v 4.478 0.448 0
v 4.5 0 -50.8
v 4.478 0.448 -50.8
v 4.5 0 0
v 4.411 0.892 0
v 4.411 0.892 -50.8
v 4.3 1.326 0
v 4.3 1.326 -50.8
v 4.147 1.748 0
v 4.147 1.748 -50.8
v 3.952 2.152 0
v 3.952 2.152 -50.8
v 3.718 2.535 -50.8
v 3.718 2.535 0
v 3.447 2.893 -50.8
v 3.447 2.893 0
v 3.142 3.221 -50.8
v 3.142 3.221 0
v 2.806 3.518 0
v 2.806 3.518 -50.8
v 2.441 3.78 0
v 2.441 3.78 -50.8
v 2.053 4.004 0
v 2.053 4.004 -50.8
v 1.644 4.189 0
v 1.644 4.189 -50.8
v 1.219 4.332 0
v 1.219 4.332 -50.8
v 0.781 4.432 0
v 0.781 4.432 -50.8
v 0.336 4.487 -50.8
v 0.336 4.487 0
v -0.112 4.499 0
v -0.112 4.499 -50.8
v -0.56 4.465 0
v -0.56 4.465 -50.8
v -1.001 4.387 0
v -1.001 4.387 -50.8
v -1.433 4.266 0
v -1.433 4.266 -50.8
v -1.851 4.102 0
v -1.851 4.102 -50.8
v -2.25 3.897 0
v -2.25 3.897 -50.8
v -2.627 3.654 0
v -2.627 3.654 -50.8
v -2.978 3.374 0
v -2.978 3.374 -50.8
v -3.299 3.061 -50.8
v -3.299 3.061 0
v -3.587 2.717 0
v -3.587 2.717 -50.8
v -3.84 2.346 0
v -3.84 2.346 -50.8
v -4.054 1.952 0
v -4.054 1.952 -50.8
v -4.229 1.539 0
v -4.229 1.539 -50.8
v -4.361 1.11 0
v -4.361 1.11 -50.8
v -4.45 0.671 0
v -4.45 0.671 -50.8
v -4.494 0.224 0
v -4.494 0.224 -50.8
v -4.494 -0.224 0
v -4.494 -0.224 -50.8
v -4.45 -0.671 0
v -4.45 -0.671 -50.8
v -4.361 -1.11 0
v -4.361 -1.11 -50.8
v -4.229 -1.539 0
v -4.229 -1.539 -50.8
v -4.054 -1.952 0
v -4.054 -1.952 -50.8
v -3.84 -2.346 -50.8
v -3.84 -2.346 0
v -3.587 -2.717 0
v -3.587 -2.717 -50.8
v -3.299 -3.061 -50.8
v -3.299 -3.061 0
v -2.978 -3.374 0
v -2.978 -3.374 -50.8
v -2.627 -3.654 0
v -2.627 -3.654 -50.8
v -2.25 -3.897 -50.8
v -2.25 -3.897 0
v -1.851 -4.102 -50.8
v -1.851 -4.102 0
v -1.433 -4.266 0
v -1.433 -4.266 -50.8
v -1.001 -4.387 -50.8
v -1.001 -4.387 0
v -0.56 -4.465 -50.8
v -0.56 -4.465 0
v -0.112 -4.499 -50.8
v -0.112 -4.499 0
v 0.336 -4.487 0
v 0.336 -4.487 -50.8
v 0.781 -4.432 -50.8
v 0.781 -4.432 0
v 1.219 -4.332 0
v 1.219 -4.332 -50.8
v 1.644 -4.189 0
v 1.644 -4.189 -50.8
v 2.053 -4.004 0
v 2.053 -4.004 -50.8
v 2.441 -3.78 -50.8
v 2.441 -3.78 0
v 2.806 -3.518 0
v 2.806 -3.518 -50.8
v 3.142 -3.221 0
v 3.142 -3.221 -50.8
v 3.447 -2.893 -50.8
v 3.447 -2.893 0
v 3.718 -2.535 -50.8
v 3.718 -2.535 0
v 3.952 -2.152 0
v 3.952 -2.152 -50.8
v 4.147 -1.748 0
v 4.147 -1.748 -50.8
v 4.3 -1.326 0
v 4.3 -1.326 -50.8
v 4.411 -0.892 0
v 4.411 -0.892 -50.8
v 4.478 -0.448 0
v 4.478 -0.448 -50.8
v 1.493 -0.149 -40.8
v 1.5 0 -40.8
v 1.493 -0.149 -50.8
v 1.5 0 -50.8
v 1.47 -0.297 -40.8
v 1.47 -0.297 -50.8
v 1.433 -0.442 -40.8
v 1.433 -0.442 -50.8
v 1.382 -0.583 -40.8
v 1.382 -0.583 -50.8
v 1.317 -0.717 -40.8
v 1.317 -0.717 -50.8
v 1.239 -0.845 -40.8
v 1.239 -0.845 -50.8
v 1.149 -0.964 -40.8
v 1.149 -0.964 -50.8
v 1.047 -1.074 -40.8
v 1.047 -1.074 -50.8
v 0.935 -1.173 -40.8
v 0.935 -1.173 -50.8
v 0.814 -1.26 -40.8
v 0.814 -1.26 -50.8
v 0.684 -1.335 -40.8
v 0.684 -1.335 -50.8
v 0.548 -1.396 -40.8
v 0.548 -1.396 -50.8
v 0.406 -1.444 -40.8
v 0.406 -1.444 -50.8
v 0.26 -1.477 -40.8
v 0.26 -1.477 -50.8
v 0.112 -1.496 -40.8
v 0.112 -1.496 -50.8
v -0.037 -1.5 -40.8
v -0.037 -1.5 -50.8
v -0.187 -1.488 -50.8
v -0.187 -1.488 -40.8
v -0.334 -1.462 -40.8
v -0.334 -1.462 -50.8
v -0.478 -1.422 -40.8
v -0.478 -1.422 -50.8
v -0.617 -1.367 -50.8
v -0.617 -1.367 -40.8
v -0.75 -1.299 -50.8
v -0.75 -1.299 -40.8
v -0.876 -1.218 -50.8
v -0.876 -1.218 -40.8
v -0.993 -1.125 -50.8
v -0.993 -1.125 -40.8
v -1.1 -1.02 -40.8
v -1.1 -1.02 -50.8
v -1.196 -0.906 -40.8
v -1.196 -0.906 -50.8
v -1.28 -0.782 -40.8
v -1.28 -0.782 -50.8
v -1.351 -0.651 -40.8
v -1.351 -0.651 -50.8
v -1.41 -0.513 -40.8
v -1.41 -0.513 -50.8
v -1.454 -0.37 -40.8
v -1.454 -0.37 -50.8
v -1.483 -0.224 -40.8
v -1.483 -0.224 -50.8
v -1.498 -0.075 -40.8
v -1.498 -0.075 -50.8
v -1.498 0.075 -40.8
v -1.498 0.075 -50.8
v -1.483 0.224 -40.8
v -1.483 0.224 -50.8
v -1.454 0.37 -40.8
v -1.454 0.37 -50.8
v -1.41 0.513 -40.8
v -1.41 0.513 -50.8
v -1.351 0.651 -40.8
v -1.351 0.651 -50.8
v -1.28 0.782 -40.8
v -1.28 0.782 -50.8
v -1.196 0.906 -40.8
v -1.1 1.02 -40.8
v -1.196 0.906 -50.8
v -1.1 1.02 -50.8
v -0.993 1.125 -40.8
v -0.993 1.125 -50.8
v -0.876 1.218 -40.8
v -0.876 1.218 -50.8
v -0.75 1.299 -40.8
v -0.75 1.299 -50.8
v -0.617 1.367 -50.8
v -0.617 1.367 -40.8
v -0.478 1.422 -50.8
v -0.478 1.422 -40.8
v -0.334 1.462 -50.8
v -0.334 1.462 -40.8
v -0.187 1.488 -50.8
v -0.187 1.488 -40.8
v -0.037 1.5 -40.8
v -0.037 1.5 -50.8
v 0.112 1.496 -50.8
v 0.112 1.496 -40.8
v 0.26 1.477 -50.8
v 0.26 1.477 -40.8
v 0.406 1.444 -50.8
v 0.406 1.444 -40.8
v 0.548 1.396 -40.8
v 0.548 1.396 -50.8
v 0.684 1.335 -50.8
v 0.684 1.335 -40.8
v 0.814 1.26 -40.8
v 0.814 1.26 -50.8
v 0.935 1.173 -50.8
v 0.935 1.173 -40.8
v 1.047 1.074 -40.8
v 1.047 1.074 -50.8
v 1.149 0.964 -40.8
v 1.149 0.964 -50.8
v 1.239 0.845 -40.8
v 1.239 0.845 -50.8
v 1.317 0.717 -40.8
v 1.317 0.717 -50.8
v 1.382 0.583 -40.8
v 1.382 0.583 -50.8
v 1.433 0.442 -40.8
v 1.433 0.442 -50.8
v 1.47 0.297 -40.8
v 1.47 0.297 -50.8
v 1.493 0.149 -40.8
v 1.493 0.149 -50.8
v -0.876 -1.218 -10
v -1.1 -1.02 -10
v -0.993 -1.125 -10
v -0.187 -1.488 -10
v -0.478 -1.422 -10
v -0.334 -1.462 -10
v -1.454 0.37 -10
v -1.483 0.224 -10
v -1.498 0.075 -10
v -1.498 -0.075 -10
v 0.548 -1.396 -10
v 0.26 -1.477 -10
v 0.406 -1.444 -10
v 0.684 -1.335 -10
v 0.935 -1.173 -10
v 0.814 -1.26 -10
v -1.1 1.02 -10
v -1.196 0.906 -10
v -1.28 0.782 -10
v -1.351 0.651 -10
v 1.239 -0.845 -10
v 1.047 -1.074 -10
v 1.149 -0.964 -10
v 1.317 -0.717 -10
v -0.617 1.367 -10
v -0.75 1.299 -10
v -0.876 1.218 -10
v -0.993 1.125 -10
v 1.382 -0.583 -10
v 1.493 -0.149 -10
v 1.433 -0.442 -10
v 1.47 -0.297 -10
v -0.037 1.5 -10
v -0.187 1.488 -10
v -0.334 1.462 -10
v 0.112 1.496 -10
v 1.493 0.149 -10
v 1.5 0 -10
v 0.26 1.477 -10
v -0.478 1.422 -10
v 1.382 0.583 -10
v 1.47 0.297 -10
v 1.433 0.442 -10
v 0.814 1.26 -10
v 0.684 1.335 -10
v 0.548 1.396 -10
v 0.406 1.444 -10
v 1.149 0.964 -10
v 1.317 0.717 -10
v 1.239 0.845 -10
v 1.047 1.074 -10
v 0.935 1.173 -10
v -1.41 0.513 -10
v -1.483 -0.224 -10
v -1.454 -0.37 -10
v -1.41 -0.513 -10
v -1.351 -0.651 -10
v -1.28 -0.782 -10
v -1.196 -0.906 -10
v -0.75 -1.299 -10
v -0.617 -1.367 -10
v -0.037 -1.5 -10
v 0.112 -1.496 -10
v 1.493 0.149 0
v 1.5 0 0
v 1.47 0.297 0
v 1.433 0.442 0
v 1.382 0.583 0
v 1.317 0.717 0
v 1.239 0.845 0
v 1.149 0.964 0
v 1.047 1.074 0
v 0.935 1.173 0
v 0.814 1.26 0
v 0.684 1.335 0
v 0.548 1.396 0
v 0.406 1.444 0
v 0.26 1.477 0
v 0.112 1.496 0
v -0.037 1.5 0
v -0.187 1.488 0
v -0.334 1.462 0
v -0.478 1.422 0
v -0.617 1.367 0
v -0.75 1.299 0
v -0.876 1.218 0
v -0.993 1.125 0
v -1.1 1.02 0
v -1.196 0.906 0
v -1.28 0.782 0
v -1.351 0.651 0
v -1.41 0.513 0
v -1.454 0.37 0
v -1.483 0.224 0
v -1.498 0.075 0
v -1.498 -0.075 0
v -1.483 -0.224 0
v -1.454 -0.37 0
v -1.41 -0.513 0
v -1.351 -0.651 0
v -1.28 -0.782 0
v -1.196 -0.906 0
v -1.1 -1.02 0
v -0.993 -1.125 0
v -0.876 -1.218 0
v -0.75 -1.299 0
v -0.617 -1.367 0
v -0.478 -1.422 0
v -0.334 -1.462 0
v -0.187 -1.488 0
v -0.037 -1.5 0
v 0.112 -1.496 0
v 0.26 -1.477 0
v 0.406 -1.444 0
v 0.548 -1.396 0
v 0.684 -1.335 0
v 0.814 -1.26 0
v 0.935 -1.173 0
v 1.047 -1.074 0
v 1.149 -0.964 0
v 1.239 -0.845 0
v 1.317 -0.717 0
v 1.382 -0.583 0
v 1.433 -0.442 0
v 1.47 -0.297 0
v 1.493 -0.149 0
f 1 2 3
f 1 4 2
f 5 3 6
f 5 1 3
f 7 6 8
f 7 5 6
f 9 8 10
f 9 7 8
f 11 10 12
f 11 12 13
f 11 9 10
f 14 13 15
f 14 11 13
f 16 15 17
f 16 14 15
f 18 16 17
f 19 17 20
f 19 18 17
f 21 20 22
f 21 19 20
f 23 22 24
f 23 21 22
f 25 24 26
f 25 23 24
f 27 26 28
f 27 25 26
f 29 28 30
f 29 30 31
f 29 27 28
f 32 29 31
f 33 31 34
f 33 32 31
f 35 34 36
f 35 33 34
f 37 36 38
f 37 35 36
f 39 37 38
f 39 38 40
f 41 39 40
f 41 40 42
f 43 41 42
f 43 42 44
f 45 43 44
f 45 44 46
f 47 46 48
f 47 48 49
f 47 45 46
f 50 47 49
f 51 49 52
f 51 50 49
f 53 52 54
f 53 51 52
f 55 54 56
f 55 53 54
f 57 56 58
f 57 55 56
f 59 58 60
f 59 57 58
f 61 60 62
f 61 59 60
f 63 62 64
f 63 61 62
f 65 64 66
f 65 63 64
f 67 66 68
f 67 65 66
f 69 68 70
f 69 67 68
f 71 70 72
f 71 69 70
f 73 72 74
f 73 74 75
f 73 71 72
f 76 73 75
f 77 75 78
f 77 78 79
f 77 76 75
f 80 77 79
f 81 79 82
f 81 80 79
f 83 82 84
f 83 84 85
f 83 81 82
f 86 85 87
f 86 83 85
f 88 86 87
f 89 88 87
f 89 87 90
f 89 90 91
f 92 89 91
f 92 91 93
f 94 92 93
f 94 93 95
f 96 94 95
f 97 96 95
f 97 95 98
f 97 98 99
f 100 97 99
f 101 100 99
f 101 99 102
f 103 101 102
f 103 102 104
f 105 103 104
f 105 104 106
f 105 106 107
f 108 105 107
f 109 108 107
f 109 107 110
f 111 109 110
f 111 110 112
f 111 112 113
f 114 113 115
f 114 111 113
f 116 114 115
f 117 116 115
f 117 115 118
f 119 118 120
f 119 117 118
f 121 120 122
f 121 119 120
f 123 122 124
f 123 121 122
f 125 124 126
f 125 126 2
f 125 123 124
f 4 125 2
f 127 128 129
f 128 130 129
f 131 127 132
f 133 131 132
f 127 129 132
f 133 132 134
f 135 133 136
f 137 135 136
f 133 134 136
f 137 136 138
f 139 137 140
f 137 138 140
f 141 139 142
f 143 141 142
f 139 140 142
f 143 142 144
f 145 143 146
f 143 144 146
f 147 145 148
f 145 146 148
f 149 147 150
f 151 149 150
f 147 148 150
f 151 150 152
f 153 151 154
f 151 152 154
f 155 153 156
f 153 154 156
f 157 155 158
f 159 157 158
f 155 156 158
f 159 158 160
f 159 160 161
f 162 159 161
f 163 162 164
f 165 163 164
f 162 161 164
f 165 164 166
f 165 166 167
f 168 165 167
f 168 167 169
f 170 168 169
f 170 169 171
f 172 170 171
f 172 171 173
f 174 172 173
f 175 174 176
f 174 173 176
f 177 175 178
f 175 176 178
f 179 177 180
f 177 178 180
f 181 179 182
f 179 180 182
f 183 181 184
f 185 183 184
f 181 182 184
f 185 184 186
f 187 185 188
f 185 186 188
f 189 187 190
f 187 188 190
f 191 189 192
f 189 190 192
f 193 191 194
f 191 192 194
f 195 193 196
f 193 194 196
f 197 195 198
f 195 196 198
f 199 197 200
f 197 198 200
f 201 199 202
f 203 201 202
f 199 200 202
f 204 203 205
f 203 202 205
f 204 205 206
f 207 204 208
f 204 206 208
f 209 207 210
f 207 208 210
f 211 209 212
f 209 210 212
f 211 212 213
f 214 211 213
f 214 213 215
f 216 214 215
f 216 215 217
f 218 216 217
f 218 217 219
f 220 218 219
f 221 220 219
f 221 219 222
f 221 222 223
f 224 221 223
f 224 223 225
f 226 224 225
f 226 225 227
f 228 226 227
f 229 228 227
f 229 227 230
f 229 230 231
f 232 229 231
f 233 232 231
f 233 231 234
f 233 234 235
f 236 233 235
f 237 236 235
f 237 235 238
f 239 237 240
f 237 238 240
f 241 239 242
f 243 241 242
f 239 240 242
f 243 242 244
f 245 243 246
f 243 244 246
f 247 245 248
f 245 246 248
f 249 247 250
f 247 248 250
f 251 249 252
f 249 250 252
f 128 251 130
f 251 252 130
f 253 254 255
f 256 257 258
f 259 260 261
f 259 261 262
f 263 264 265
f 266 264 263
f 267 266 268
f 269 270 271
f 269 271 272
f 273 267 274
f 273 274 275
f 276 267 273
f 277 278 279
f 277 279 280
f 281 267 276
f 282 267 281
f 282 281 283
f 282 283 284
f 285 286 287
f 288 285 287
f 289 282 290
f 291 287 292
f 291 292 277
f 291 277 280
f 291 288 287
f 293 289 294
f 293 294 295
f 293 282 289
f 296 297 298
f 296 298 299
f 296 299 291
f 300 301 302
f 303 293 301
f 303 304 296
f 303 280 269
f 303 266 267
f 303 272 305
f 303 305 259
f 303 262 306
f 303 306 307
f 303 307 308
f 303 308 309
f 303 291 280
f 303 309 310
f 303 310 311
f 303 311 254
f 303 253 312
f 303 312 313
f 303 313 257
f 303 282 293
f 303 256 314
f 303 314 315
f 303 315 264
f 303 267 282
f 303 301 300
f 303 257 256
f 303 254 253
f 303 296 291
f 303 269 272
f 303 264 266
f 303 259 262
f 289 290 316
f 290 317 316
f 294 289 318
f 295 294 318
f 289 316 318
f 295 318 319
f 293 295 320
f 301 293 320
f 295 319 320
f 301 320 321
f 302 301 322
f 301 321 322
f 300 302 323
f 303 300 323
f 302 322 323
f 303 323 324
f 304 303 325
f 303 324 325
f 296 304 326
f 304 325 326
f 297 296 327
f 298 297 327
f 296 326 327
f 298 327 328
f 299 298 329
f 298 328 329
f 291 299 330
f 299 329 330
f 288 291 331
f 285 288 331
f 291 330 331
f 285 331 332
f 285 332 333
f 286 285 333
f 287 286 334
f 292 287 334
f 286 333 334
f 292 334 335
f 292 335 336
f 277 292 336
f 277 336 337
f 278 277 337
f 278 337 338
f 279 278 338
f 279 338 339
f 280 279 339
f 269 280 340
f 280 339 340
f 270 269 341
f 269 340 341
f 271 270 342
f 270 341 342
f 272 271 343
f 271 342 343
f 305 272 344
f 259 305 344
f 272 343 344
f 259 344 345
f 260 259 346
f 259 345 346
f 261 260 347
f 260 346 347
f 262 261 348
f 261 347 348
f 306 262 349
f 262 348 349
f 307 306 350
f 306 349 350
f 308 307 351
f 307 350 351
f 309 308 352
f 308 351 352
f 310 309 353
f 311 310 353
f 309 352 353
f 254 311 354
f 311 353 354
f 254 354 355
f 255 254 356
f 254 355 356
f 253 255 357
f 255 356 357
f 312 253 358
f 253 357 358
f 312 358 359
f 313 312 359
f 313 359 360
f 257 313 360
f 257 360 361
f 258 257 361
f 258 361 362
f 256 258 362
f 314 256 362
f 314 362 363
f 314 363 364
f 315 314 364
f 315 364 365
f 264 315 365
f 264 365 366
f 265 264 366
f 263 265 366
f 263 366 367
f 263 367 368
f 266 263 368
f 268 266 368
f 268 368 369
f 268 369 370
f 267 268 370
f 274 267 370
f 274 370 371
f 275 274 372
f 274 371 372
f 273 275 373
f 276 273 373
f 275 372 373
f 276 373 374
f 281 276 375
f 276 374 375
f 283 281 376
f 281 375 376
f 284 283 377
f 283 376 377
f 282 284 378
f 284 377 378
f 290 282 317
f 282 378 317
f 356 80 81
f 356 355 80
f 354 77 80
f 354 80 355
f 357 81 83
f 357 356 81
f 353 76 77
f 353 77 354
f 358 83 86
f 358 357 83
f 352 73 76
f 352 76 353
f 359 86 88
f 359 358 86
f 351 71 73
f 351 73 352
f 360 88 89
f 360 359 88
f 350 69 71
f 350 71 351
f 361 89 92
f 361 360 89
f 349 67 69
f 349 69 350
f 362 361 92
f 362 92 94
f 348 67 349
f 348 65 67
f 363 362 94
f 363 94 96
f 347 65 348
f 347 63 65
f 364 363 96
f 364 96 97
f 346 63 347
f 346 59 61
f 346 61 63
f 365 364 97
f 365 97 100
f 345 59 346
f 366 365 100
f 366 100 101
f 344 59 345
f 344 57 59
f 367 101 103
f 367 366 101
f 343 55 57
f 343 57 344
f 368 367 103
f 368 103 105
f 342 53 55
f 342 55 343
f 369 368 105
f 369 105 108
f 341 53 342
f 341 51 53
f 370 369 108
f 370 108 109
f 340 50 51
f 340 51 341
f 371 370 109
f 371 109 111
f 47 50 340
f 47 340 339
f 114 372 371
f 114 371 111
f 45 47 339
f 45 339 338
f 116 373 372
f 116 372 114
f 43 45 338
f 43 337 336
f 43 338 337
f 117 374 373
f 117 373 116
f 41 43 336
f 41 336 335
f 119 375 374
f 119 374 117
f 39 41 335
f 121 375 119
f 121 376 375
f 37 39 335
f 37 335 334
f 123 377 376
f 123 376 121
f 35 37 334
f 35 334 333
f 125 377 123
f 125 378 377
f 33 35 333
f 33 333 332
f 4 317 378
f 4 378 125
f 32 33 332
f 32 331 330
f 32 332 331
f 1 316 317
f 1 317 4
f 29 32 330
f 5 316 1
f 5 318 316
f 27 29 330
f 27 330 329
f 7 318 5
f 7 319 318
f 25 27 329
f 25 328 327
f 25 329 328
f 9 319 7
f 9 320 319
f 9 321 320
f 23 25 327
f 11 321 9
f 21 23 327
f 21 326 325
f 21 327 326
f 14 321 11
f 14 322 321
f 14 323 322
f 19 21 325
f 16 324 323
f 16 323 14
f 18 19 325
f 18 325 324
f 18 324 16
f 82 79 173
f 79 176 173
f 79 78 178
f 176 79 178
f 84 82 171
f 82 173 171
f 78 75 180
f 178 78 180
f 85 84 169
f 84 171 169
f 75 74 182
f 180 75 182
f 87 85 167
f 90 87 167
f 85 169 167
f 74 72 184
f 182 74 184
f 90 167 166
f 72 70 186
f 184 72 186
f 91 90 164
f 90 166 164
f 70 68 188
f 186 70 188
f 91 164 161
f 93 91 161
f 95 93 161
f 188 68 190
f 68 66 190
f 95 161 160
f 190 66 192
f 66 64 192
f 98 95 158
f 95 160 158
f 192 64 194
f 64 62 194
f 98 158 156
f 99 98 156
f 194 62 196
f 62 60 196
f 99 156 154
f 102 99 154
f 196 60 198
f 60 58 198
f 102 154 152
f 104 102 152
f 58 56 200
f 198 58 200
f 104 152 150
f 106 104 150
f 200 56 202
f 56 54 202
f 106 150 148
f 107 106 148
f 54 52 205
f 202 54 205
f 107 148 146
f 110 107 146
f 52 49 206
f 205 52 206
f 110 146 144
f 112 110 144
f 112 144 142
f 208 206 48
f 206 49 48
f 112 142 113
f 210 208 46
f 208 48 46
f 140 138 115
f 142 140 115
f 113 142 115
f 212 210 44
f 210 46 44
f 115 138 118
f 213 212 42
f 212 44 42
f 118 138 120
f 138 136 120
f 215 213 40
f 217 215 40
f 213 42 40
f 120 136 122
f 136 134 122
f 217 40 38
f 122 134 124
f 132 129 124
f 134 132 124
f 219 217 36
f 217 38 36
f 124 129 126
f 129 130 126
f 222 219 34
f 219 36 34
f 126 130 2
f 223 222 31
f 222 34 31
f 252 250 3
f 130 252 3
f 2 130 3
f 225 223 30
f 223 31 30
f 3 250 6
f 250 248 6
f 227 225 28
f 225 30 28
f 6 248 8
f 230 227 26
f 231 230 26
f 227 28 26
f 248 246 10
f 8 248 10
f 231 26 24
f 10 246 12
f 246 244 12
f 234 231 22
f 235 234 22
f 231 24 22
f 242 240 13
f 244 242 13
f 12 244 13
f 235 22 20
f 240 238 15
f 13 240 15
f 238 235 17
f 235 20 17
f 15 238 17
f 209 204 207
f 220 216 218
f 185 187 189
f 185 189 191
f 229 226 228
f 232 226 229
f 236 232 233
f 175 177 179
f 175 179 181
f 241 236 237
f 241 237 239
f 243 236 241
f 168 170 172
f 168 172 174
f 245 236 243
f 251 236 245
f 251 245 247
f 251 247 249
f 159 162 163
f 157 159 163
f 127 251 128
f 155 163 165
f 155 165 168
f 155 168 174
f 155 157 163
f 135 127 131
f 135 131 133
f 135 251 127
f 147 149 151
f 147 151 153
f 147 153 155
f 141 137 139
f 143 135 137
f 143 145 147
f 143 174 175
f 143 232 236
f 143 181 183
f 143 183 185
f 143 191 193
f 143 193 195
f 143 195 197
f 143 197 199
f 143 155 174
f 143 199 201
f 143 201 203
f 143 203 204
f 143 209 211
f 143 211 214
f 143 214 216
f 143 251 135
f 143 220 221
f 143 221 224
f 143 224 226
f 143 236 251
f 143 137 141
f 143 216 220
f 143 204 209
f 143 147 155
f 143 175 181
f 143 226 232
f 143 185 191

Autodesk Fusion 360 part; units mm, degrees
sketch "Sketch1" plane through (0, 0, 0) normal (0, 0, 1) x (1, 0, 0)
  circle A0 centre (0, 0) radius 4.5
  circle A1 centre (0, 0) radius 1.5
  dimension "d1" = 9
  dimension "d2" = 3
extrude "Extrude1" add sketch "Sketch1" against normal blind 50.8 contours A0 | A1
extrude "Extrude2" cut sketch "Sketch1" against normal blind 10 contours A1
sketch "Sketch2" plane through (0, 0, -50.8) normal (0, 0, -1) x (1, 0, 0)
  circle A0 centre (0, 0) radius 4.5
  circle A1 centre (0, 0) radius 1.5
extrude "Extrude3" cut sketch "Sketch2" against normal blind 10 contours A1
equation "d3 = -25.4 * 2 mm"
